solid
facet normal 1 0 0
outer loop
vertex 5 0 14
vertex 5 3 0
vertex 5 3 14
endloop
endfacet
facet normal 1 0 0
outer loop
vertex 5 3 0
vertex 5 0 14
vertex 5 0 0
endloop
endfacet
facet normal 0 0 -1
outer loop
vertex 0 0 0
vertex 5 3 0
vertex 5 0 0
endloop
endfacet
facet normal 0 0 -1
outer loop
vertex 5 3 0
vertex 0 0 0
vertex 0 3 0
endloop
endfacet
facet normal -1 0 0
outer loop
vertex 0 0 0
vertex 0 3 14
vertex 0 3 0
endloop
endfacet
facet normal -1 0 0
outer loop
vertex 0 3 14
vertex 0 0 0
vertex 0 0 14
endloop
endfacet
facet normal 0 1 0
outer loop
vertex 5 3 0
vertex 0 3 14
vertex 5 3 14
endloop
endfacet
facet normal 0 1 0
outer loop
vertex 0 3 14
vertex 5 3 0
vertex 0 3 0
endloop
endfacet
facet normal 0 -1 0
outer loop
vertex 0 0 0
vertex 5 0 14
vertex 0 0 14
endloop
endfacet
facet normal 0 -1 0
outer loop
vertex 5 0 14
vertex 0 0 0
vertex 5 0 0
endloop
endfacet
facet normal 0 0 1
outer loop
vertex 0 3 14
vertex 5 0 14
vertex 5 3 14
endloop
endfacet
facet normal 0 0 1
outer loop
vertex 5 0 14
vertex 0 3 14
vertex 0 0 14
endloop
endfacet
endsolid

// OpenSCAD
translate([2.5, 1.5, 1.0]) color([0.34544510653523897, 0.17790766067776254, 0.830270051764872]) cube([5, 3, 2], center=true);
translate([2.5, 1.5, 3.0]) color([0.23049353673314077, 0.3658024748453319, 0.5965890354919068]) cube([5, 3, 2], center=true);
translate([2.5, 1.5, 5.0]) color([0.14329113966210216, 0.003232100641658797, 0.6590184917581017]) cube([5, 3, 2], center=true);
translate([2.5, 1.5, 7.0]) color([0.7321014772226084, 0.9009039411186286, 0.7479768172441763]) cube([5, 3, 2], center=true);
translate([2.5, 1.5, 9.0]) color([0.29326295382626455, 0.6894664766240866, 0.932788033819558]) cube([5, 3, 2], center=true);
translate([2.5, 1.5, 11.0]) color([0.23286310478430694, 0.14188743522012004, 0.4540480681686925]) cube([5, 3, 2], center=true);
translate([2.5, 1.5, 13.0]) color([0.4766939084563374, 0.7074804824528956, 0.2582188407343454]) cube([5, 3, 2], center=true);
